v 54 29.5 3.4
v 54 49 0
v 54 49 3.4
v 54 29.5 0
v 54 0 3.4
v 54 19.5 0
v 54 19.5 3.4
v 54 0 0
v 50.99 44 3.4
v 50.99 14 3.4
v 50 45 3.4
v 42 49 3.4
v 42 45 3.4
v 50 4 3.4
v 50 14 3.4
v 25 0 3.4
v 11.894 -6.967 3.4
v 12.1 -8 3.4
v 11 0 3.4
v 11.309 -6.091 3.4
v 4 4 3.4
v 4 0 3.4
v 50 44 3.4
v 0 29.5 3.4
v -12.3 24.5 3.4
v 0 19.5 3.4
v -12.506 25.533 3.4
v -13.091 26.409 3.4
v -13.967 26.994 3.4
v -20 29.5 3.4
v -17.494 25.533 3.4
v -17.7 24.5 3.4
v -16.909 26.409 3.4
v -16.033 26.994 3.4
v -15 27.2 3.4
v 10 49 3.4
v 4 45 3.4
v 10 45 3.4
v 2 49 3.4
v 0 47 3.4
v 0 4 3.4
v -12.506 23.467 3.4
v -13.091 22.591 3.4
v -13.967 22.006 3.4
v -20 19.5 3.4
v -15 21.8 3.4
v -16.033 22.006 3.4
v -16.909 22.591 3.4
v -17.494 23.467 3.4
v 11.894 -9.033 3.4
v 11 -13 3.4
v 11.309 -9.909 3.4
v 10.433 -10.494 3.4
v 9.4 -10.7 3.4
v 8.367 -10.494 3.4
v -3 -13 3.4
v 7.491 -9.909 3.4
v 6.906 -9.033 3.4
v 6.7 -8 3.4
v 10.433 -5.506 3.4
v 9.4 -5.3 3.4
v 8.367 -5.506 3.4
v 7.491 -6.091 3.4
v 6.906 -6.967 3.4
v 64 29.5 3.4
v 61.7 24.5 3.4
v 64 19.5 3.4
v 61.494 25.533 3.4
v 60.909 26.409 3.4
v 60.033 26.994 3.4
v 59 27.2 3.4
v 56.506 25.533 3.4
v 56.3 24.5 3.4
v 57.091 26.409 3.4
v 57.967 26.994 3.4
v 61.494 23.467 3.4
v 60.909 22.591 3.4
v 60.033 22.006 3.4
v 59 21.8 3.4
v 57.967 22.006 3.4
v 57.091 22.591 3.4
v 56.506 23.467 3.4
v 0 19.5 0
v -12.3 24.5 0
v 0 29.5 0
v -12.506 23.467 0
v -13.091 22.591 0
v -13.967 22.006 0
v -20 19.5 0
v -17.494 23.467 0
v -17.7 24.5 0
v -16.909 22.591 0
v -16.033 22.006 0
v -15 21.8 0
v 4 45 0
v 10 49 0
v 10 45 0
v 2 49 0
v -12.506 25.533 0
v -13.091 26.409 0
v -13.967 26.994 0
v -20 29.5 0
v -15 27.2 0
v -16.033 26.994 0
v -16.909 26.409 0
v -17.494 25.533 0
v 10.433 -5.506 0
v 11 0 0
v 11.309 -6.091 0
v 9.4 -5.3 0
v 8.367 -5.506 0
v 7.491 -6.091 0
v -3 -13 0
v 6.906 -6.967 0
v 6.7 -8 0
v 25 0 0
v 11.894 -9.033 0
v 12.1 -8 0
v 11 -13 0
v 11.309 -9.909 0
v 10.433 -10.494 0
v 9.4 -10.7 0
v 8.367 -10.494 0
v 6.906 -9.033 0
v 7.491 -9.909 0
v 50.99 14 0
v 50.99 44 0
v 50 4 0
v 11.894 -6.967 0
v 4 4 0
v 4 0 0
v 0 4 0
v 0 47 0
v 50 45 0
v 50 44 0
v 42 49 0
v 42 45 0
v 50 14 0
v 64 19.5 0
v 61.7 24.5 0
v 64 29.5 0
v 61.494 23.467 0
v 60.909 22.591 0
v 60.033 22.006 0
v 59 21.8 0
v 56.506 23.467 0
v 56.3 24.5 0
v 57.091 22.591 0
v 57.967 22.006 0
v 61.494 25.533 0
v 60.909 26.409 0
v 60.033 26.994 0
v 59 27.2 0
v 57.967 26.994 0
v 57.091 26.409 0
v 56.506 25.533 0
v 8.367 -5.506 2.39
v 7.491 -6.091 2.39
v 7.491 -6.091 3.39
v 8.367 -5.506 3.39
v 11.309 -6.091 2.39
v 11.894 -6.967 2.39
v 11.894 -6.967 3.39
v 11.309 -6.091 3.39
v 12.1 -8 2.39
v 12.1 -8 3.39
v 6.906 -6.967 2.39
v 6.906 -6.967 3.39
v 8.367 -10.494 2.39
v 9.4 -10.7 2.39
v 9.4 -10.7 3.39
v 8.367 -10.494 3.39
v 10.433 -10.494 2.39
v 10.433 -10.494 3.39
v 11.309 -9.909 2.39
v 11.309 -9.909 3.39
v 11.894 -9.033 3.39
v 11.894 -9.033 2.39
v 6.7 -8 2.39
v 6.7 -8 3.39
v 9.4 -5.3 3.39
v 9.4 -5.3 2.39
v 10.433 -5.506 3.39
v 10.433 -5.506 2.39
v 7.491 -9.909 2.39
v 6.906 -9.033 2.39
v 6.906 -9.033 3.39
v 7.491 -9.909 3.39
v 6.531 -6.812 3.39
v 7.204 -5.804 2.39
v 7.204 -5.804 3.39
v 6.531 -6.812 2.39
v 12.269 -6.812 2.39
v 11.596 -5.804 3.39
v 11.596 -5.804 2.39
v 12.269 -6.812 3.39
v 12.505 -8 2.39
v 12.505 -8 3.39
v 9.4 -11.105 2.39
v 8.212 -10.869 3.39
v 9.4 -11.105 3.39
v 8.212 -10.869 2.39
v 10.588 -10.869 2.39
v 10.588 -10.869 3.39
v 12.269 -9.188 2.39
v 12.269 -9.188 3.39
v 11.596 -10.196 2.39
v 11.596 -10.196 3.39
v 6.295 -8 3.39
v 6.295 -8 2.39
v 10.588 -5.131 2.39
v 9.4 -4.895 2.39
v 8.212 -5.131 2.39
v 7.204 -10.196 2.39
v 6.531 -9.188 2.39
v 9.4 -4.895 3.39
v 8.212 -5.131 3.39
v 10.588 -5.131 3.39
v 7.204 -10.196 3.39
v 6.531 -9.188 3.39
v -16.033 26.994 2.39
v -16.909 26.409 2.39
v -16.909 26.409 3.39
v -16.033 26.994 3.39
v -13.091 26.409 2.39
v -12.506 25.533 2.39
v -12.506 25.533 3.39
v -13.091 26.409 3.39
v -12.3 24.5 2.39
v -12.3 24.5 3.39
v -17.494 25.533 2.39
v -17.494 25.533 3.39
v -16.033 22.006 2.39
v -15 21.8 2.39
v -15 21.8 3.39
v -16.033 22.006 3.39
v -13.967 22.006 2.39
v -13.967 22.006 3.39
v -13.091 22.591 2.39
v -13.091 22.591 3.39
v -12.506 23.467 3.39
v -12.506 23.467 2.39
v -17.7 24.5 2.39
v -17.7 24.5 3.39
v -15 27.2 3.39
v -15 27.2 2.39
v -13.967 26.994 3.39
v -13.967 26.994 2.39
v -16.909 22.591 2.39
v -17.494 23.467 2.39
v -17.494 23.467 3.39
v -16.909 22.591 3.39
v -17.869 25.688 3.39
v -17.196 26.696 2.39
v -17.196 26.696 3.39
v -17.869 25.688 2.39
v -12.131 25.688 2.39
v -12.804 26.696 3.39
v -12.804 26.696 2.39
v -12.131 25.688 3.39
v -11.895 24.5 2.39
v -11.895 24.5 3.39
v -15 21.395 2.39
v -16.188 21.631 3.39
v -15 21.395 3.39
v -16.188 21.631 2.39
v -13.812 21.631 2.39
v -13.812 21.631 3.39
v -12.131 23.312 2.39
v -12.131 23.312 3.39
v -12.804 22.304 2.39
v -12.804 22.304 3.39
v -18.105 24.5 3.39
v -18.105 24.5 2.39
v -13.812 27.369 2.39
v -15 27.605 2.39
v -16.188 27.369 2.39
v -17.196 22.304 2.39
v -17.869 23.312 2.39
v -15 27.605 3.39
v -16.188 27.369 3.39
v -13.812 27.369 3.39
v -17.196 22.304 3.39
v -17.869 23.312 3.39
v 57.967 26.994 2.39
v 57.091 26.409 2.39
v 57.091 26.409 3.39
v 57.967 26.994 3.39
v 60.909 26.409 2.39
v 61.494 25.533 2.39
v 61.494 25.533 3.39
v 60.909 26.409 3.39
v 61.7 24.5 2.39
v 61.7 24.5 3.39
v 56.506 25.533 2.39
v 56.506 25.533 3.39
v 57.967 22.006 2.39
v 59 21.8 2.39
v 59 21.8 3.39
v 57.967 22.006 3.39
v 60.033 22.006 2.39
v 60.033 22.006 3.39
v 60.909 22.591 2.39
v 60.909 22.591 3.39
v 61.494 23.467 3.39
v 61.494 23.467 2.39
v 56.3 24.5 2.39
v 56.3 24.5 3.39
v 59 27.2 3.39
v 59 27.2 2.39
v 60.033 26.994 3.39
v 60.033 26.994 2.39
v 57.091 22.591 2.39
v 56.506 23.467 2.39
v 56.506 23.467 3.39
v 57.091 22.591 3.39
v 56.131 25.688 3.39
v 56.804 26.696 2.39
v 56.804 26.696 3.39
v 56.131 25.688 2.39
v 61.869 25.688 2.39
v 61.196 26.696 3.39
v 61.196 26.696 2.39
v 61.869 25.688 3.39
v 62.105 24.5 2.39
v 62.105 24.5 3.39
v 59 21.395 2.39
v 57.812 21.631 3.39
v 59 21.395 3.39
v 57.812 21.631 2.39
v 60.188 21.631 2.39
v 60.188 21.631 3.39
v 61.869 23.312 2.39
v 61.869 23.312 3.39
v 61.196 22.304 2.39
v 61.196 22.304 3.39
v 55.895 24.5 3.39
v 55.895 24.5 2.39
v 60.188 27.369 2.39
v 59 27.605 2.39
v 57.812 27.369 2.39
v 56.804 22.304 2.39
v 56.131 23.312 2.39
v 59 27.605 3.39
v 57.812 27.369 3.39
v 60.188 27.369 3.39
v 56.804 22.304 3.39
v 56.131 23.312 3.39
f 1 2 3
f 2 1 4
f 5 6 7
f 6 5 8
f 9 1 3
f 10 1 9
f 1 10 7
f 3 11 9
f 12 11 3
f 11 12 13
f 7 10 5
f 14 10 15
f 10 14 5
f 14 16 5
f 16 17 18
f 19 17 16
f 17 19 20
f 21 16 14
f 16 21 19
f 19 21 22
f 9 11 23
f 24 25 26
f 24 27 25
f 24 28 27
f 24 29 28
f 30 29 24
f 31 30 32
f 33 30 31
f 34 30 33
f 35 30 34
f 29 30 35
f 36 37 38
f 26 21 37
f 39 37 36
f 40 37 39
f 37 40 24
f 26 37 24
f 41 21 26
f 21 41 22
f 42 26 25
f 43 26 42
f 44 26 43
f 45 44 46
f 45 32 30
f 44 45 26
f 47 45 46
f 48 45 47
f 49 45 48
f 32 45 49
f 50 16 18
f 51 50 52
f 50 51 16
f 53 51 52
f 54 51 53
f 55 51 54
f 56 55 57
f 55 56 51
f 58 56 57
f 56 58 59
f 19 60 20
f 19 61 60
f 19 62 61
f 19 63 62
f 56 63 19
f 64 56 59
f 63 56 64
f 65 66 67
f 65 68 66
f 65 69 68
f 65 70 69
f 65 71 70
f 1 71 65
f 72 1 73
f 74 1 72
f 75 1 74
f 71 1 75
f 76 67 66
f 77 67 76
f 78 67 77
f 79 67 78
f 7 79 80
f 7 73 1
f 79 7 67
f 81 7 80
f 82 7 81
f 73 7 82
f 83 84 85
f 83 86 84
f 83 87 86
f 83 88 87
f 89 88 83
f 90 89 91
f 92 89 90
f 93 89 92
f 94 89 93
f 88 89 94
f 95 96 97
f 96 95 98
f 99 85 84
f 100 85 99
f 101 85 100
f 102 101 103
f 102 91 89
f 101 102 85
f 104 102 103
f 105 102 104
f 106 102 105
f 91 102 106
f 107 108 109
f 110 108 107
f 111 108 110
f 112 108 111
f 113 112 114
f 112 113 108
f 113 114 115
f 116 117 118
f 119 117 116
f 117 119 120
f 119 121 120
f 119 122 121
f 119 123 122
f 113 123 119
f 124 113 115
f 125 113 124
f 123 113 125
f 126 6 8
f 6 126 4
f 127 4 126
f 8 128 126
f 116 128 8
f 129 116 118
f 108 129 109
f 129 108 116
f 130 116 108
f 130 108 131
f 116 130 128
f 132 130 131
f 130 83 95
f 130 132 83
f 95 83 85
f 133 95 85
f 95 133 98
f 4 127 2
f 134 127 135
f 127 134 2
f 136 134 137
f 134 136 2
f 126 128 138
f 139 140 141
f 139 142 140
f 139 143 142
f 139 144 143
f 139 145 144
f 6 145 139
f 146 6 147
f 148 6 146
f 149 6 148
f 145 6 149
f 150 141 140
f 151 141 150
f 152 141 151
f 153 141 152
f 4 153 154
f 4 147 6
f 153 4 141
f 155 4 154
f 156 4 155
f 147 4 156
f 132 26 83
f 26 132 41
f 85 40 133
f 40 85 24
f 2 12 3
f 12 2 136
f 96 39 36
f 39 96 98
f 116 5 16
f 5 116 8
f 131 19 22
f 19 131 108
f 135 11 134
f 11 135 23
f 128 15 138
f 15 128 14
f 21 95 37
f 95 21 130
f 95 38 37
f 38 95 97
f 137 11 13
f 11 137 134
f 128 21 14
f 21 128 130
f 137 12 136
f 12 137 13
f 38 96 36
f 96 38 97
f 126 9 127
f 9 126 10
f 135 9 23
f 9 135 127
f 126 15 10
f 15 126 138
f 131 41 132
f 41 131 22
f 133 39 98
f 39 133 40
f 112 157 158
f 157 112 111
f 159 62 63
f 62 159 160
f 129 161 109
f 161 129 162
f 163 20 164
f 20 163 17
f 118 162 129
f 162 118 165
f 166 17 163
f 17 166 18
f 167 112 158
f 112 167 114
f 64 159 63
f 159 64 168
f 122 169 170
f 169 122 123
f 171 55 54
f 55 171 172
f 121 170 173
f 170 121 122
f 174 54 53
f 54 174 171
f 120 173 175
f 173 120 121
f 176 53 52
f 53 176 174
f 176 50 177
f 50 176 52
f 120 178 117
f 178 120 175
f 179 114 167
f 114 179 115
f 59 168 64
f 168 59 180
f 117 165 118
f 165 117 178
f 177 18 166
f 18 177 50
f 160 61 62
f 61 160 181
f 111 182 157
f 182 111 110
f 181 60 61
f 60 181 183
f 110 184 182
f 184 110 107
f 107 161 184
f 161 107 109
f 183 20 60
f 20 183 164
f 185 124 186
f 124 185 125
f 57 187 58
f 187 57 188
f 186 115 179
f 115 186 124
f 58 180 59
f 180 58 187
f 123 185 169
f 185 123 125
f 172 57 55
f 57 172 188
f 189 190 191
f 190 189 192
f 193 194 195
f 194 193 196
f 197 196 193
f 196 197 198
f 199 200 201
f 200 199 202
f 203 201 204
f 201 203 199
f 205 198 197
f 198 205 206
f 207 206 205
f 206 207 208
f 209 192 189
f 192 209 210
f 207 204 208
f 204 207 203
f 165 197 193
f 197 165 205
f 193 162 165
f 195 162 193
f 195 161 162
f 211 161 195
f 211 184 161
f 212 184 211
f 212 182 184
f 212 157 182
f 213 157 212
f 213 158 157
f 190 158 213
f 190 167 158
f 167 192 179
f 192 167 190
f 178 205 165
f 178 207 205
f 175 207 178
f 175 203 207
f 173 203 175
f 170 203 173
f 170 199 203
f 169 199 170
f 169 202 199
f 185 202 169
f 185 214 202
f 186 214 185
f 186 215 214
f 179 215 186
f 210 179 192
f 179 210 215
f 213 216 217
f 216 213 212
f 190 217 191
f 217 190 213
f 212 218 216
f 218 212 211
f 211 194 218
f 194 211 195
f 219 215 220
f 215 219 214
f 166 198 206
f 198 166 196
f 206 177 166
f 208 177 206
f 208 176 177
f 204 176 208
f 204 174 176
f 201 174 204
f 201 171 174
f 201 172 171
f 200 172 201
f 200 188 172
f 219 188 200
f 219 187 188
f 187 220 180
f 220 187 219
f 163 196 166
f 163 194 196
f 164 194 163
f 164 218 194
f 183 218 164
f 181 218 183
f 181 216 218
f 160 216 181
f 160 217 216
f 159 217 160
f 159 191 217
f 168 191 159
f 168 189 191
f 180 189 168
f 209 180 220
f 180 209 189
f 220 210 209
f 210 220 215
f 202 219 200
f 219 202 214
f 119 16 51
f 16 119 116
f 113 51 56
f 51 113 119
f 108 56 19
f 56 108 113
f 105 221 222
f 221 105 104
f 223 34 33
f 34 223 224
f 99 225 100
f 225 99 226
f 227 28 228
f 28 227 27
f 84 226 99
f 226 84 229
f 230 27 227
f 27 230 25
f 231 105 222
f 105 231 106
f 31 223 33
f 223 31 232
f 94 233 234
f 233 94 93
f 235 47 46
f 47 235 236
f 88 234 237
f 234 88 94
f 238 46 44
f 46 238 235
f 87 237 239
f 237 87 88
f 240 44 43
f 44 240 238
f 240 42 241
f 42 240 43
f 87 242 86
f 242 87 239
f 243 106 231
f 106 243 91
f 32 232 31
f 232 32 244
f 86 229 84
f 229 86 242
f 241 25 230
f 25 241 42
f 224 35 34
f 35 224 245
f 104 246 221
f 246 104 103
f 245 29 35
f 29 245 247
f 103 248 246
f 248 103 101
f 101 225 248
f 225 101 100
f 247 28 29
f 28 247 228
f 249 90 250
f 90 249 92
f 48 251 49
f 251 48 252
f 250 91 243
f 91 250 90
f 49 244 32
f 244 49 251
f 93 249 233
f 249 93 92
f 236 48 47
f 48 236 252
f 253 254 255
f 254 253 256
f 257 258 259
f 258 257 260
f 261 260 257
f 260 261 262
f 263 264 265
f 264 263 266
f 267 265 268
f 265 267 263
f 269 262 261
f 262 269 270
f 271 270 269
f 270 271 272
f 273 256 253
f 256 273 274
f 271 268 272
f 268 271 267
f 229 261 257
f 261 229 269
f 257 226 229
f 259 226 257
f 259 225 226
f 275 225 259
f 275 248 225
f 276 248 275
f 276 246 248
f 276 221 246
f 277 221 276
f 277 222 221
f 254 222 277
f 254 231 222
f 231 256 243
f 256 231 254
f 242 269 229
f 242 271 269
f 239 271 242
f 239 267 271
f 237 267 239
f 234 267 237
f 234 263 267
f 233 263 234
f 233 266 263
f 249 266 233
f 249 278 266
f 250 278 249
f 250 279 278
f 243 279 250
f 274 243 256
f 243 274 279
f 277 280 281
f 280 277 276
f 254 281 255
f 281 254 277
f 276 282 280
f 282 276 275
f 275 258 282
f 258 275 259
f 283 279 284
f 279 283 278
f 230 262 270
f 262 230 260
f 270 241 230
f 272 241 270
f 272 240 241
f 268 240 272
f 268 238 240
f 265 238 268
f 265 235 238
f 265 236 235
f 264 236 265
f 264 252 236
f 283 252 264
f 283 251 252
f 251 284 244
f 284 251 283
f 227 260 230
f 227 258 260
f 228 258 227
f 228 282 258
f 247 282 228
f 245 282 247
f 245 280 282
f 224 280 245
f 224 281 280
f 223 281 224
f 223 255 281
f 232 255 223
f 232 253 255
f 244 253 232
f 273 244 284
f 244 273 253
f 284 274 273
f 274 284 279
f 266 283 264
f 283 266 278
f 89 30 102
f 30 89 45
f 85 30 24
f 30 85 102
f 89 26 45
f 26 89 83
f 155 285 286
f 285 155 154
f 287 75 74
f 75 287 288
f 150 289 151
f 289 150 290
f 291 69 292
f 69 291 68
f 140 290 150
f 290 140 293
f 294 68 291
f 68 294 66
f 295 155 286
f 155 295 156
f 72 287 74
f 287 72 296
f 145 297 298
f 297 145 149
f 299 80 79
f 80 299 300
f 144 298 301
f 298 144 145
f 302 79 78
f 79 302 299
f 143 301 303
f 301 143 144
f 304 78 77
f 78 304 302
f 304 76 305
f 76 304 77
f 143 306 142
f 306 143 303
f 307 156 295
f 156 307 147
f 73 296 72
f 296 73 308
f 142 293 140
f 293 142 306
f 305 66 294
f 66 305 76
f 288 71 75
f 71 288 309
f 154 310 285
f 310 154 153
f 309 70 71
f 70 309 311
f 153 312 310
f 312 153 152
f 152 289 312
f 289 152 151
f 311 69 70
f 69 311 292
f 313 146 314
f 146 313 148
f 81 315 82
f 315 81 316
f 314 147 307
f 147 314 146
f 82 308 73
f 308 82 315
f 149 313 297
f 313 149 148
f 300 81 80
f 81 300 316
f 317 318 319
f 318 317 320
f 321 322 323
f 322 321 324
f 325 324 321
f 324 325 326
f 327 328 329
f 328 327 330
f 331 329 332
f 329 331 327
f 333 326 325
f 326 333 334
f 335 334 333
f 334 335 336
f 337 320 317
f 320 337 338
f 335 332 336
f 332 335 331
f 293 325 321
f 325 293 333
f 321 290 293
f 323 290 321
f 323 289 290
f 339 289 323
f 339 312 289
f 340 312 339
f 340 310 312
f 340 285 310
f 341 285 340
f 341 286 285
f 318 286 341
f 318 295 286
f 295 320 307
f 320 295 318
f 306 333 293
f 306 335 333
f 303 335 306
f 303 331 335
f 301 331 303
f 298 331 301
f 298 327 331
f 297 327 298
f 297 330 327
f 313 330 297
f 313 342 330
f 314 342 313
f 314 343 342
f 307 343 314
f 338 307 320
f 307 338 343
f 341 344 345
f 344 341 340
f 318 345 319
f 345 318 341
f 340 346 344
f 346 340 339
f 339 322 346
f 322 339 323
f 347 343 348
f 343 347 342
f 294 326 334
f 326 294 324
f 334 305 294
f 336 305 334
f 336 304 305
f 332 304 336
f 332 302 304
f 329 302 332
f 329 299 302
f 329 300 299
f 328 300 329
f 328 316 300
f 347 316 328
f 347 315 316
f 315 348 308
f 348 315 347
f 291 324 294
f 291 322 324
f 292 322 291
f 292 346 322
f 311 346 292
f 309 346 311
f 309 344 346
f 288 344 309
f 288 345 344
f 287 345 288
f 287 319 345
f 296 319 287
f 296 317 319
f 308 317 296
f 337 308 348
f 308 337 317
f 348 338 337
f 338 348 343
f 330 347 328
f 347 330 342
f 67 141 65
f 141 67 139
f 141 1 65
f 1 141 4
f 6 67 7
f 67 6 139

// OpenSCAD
/**
	Copyright (c) 2021 etkaar <https://github.com/etkaar>
	
	Permission is hereby granted, free of charge, to any person obtaining a copy
	of this software and associated documentation files (the "Software"), to deal
	in the Software without restriction, including without limitation the rights
	to use, copy, modify, merge, publish, distribute, sublicense, and/or sell
	copies of the Software, and to permit persons to whom the Software is
	furnished to do so, subject to the following conditions:
	
	The above copyright notice and this permission notice shall be included in
	all copies or substantial portions of the Software.
	
	THE SOFTWARE IS PROVIDED "AS IS", WITHOUT WARRANTY OF ANY KIND, EXPRESS OR
	IMPLIED, INCLUDING BUT NOT LIMITED TO THE WARRANTIES OF MERCHANTABILITY,
	FITNESS FOR A PARTICULAR PURPOSE AND NONINFRINGEMENT. IN NO EVENT SHALL
	THE AUTHORS OR COPYRIGHT HOLDERS BE LIABLE FOR ANY CLAIM, DAMAGES OR
	OTHER LIABILITY, WHETHER IN AN ACTION OF CONTRACT, TORT OR OTHERWISE,
	ARISING FROM, OUT OF OR IN CONNECTION WITH THE SOFTWARE OR THE USE
	OR OTHER DEALINGS IN THE SOFTWARE.
**/

/**
*	Used to fix render bugs, therefore should not have
*	any visual or technical effect, see:
*	https://en.wikibooks.org/wiki/OpenSCAD_User_Manual/FAQ#What_are_those_strange_flickering_artifacts_in_the_preview?
*/
OVERLAP1 = 0.01;
OVERLAP2 = 2 * OVERLAP1;

WIDTH = 41;
LENGTH = 46;
THICKNESS = 4;
HEIGHT = 3.4;

HIDE_TOP_PLATE = true;
HIDE_BASE_PLATE = false;

LED_HOLE_DMTR = 5.4;
LED_HOLDER_WIDTH = 10;

if (!HIDE_BASE_PLATE) {
	plate(1);
}

if (!HIDE_TOP_PLATE) {
	translate([0, 0, HEIGHT])
	#plate(2);
}

module plate(_PART) {
	_plate_height = (_PART == 1)
		? (HEIGHT)
		: (1.6);
	
	difference() {
		cube([LENGTH + 2 * THICKNESS, WIDTH + 2 * THICKNESS, _plate_height]);
		
		translate([THICKNESS, THICKNESS, -OVERLAP1]) {
			cube([LENGTH, WIDTH, HEIGHT + OVERLAP2]);
		}
		
		translate([2 + 2 * THICKNESS, 2 * THICKNESS + OVERLAP1, -OVERLAP1]) {
			cube([LENGTH - 2 - 3 * THICKNESS, WIDTH, HEIGHT + OVERLAP2]);
		}

		// Recess on the right side
		translate([LENGTH + THICKNESS - OVERLAP1, THICKNESS + 10, -OVERLAP1]) {
			cube([1, WIDTH - 10 - 1, HEIGHT + OVERLAP2]);
		}
		
		// Chamfers
		translate([0, 0, -OVERLAP1])
		cylinder($fn=4, h=HEIGHT + OVERLAP2, d=8);
		
		translate([0, WIDTH + 2 * THICKNESS, -OVERLAP1])
		cylinder($fn=4, h=HEIGHT + OVERLAP2, d=4);
		
	}

	_width = (LED_HOLDER_WIDTH + 4) * (-1);
	_height = -13;
	_pitch = -14;

	/**
	*	Slope
	*/
	translate([25, 0, 0]) {
		difference() {
			linear_extrude(_plate_height)
			polygon([[0, 0], [_width, 0], [_width + _pitch, _height], [_pitch, _height]]);
			
			// LED hole
			translate([-15.6, _height + 5, -OVERLAP1]) {
				if (_PART == 1) {
					cylinder($fn=16, h=_plate_height + OVERLAP2, d=LED_HOLE_DMTR);
					
					translate([0, 0, _plate_height - 1]) {
						cylinder($fn=16, h=1, d=LED_HOLE_DMTR * 1.15);
					}
				} else if (_PART == 2) {
					translate([-LED_HOLE_DMTR / 2 + 1.5, 0, 0])
					#cylinder($fn=16, h=_plate_height + OVERLAP2, d=1.5);
					
					translate([LED_HOLE_DMTR / 2 - 1.5, 0, 0])
					#cylinder($fn=16, h=_plate_height + OVERLAP2, d=1.5);
				}
			}
		}
	}

	/**
	*	Left
	*/
	translate([-20, (WIDTH - THICKNESS / 2) / 2, 0]) {
		difference() {
			cube([20, LED_HOLDER_WIDTH, _plate_height]);
			
			// LED hole
			translate([5, LED_HOLDER_WIDTH / 2, -OVERLAP1]) {
				if (_PART == 1) {
					cylinder($fn=16, h=_plate_height + OVERLAP2, d=LED_HOLE_DMTR);
					
					translate([0, 0, _plate_height - 1]) {
						cylinder($fn=16, h=1, d=LED_HOLE_DMTR * 1.15);
					}
				} else if (_PART == 2) {
					translate([0, -LED_HOLE_DMTR / 2 + 1.5, 0])
					#cylinder($fn=16, h=_plate_height + OVERLAP2, d=1.5);
					
					translate([0, LED_HOLE_DMTR / 2 - 1.5, 0])
					#cylinder($fn=16, h=_plate_height + OVERLAP2, d=1.5);
				}
			}
		}
	}

	/**
	*	Right
	*/
	translate([LENGTH + 2 * THICKNESS, (WIDTH - THICKNESS / 2) / 2, 0]) {
		difference() {
			cube([LED_HOLDER_WIDTH, LED_HOLDER_WIDTH, _plate_height]);
			
			// LED hole
			translate([LED_HOLDER_WIDTH - 5, LED_HOLDER_WIDTH / 2, -OVERLAP1]) {
				if (_PART == 1) {
					cylinder($fn=16, h=HEIGHT + OVERLAP2, d=LED_HOLE_DMTR);
					
					translate([0, 0, HEIGHT - 1]) {
						cylinder($fn=16, h=1, d=LED_HOLE_DMTR * 1.15);
					}
				} else if (_PART == 2) {
					translate([0, -LED_HOLE_DMTR / 2 + 1.5, 0])
					#cylinder($fn=16, h=_plate_height + OVERLAP2, d=1.5);
					
					translate([0, LED_HOLE_DMTR / 2 - 1.5, 0])
					#cylinder($fn=16, h=_plate_height + OVERLAP2, d=1.5);
				}
			}
		}
	}
}
